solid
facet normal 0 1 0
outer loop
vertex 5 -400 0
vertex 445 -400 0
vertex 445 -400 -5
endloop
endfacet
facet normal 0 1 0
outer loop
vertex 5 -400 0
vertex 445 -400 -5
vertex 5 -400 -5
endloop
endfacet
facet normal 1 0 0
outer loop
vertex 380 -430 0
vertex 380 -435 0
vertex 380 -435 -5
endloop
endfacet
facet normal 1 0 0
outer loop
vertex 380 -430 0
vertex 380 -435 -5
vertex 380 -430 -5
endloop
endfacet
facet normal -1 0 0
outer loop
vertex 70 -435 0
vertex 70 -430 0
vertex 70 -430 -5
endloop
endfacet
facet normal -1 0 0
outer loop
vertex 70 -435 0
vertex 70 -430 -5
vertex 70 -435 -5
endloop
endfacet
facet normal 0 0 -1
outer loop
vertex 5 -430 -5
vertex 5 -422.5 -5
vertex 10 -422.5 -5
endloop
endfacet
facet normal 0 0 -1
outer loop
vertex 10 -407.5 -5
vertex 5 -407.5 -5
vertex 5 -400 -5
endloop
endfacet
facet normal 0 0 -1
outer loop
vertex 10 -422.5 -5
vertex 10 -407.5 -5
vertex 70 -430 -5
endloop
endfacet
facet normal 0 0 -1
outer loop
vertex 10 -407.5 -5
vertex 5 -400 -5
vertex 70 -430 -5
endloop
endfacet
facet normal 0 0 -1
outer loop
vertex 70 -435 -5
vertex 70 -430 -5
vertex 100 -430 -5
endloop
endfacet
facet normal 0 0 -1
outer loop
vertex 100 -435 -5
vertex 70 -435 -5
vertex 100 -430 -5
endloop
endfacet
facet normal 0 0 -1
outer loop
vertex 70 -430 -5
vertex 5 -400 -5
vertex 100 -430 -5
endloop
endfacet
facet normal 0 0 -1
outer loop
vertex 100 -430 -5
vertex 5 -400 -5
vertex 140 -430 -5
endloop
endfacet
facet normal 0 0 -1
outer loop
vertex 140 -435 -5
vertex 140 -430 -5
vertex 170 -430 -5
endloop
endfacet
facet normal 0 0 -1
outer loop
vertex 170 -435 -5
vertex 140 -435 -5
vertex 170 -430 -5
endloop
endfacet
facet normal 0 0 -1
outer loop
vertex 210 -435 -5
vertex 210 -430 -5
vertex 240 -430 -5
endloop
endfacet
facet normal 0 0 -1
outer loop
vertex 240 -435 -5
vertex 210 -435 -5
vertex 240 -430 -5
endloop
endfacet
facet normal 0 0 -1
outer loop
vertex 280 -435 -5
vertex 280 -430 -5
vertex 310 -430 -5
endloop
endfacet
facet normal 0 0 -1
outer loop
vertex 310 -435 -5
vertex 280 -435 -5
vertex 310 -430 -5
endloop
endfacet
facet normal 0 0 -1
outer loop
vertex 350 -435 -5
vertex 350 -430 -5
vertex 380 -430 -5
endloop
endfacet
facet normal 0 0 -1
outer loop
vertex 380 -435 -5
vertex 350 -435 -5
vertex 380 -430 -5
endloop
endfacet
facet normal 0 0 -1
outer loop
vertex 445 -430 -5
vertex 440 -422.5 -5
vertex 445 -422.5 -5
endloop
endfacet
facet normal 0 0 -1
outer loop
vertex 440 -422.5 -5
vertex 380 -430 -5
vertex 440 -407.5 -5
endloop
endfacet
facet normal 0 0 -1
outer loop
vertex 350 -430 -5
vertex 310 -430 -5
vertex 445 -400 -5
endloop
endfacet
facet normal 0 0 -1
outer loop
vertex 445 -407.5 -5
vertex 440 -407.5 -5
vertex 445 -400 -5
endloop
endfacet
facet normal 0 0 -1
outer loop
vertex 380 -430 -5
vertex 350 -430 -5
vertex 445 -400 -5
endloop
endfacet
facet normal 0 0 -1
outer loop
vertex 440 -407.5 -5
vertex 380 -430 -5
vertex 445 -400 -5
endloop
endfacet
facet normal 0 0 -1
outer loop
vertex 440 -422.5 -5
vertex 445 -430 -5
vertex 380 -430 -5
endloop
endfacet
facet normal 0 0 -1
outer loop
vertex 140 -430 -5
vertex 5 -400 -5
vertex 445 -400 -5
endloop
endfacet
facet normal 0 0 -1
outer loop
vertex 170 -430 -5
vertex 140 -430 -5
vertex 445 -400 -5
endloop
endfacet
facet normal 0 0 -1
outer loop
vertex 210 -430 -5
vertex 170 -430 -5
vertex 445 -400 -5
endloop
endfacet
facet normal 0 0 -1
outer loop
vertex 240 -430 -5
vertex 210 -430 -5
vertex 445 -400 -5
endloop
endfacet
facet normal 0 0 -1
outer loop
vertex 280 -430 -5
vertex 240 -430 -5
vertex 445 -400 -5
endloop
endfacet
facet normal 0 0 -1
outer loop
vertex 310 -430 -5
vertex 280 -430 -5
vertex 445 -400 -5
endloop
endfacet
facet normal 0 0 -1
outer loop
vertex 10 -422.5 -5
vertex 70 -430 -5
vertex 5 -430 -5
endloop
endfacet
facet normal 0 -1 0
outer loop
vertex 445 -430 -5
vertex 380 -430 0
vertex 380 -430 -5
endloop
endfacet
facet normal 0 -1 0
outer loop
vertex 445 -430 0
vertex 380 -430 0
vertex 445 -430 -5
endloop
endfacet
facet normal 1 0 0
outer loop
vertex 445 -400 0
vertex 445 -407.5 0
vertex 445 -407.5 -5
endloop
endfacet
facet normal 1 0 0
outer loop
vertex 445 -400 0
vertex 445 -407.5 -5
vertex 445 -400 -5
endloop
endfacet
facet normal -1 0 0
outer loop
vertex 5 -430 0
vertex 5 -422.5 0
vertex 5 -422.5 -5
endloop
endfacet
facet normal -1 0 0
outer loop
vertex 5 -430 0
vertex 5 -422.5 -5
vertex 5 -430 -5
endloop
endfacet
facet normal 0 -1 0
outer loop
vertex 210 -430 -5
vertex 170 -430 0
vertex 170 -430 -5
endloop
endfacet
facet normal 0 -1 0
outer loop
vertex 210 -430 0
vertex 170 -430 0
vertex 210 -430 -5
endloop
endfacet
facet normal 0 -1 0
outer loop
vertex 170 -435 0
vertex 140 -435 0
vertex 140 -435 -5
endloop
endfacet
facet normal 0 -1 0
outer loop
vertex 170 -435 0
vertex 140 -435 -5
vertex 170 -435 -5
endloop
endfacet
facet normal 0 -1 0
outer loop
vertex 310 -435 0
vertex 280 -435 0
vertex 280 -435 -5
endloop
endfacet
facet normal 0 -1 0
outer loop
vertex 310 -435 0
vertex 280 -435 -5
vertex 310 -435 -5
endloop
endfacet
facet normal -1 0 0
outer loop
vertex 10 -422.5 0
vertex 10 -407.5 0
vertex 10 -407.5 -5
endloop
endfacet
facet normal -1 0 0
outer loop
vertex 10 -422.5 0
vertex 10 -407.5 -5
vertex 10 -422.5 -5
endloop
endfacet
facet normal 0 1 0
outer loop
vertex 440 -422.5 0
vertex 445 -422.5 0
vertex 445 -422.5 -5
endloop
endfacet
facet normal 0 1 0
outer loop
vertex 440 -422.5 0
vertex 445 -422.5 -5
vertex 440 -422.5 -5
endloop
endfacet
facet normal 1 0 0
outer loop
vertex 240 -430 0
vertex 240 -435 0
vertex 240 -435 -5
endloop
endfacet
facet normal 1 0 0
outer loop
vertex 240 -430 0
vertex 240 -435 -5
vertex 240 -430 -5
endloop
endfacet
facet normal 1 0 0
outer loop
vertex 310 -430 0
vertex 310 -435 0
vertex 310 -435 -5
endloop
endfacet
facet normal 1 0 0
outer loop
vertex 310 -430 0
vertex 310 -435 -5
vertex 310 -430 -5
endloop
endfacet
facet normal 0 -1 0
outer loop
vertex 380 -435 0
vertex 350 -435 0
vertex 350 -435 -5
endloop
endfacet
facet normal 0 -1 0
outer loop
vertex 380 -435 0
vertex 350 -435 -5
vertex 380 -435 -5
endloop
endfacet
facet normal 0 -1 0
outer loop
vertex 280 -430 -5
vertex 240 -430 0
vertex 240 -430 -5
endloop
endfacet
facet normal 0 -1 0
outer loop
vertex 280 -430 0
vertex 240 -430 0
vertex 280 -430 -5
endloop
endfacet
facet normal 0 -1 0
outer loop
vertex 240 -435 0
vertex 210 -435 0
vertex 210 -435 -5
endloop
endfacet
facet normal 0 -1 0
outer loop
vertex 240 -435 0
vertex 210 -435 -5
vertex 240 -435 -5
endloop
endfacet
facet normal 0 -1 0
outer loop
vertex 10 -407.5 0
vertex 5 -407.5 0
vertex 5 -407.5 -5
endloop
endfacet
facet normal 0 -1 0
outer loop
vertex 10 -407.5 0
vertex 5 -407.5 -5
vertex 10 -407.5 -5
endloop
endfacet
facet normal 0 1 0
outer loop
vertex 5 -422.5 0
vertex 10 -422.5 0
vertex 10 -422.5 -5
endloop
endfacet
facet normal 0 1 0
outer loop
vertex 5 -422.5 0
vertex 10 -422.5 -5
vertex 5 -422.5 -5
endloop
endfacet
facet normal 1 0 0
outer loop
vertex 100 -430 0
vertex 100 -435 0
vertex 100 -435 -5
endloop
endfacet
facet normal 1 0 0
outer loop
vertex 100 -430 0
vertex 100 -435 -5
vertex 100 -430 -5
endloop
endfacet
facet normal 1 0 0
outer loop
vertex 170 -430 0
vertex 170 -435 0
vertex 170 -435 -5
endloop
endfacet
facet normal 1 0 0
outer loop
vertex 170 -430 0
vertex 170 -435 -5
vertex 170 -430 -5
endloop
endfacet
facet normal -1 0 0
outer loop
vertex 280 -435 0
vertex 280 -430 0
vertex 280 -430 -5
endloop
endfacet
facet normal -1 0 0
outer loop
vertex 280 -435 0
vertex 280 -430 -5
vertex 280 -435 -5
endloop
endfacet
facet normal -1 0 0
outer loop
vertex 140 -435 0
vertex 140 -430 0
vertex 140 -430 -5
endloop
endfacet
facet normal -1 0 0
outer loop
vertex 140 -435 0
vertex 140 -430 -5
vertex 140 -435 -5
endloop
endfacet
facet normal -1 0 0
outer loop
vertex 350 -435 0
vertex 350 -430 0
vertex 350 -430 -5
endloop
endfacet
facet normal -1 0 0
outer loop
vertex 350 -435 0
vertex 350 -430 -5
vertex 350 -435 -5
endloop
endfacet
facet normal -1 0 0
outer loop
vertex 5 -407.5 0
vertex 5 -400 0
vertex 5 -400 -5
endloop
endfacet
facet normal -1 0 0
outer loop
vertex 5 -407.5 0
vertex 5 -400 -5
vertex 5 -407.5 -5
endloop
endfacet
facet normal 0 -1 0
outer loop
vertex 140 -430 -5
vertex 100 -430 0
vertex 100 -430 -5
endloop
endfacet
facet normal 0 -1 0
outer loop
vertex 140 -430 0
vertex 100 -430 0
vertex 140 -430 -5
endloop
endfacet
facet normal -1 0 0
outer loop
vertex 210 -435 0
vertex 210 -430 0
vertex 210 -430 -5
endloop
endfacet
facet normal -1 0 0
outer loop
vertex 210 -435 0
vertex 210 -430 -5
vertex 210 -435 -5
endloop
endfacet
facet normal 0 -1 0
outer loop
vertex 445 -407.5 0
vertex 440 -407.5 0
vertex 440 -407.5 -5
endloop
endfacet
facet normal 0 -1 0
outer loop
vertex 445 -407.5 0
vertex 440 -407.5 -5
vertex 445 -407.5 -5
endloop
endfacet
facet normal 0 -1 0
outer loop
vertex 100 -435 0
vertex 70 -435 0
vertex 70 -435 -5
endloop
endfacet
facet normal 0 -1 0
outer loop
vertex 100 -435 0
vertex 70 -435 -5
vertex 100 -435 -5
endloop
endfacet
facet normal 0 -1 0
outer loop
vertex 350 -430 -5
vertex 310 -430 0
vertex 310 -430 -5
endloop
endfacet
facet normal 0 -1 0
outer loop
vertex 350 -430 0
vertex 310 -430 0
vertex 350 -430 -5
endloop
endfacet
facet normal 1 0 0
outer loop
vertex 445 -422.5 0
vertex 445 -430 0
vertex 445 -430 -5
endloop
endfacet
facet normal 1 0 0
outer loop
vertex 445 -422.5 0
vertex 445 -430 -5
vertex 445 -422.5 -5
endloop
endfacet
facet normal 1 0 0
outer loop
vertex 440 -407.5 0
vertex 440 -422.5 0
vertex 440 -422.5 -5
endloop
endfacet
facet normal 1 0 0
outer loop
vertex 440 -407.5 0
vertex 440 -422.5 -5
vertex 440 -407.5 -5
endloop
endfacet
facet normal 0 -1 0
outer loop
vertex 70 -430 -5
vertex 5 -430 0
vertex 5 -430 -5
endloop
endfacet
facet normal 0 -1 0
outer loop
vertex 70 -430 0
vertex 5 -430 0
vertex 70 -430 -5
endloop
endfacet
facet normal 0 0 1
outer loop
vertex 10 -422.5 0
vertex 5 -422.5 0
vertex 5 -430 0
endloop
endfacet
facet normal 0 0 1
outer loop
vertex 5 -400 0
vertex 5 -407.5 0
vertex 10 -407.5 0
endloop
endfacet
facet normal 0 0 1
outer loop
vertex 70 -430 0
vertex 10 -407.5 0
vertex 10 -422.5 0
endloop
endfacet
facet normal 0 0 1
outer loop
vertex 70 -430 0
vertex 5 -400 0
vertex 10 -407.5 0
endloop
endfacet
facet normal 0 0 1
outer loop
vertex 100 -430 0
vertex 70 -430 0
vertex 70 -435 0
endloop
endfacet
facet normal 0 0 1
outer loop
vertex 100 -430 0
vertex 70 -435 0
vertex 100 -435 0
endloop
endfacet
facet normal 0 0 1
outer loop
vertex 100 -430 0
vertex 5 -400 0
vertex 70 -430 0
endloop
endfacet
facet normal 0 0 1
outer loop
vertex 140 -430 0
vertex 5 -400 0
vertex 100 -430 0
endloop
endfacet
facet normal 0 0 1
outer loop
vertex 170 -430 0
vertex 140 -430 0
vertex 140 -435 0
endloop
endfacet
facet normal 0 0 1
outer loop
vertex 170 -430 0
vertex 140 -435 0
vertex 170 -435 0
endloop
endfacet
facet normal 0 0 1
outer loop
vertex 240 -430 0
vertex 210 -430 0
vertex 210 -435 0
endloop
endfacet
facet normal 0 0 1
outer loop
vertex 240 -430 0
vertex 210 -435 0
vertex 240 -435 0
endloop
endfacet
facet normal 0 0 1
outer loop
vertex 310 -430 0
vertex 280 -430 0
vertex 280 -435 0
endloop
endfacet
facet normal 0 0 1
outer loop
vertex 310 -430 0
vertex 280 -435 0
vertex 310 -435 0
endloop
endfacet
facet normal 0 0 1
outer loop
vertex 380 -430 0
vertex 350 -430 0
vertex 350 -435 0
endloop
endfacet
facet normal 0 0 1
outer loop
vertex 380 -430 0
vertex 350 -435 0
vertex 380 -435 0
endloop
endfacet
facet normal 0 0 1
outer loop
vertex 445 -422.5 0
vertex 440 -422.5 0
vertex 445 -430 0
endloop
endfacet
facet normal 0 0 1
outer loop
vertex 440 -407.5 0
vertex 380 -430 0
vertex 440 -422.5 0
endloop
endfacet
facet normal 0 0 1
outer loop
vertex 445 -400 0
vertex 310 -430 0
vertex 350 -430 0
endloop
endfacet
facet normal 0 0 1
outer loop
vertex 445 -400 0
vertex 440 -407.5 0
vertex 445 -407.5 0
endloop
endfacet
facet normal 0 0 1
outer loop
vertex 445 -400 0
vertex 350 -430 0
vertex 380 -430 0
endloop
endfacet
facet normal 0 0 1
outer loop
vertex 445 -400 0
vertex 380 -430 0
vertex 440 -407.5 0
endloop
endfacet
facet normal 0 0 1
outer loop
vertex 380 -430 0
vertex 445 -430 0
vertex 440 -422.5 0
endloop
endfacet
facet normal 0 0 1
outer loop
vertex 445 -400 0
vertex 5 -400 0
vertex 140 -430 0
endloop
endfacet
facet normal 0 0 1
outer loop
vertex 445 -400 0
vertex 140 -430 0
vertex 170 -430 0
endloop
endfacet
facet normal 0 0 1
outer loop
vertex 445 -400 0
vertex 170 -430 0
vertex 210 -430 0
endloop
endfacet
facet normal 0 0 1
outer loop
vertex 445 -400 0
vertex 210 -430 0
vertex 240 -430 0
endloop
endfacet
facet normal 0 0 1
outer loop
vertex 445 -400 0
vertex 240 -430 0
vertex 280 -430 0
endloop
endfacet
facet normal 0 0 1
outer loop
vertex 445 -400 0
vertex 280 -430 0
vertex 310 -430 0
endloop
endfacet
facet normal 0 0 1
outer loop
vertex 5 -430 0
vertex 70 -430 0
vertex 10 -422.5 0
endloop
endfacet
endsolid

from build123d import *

# Parameters (mm, degrees)
BOSS_EXTRUDE1_DEPTH = 5


with BuildPart() as part:
    # Sketch1 → Boss-Extrude1 (new body)
    with BuildSketch(Plane.XY):
        Polygon((170, -430), (210, -430), (210, -435), (240, -435), (240, -430), (280, -430), (280, -435), (310, -435), (310, -430), (350, -430), (350, -435), (380, -435), (380, -430), (440.000271395, -430), (445, -430), (445, -422.5), (440.000271395, -422.5), (440.000271395, -407.5), (445, -407.5), (445, -400), (440.000271395, -400), (9.999728605, -400), (5, -400), (5, -407.5), (9.999728605, -407.5), (9.999728605, -422.5), (5, -422.5), (5, -430), (9.999728605, -430), (70, -430), (70, -435), (100, -435), (100, -430), (140, -430), (140, -435), (170, -435), align=None)
    extrude(amount=-BOSS_EXTRUDE1_DEPTH)


solid = part.part
